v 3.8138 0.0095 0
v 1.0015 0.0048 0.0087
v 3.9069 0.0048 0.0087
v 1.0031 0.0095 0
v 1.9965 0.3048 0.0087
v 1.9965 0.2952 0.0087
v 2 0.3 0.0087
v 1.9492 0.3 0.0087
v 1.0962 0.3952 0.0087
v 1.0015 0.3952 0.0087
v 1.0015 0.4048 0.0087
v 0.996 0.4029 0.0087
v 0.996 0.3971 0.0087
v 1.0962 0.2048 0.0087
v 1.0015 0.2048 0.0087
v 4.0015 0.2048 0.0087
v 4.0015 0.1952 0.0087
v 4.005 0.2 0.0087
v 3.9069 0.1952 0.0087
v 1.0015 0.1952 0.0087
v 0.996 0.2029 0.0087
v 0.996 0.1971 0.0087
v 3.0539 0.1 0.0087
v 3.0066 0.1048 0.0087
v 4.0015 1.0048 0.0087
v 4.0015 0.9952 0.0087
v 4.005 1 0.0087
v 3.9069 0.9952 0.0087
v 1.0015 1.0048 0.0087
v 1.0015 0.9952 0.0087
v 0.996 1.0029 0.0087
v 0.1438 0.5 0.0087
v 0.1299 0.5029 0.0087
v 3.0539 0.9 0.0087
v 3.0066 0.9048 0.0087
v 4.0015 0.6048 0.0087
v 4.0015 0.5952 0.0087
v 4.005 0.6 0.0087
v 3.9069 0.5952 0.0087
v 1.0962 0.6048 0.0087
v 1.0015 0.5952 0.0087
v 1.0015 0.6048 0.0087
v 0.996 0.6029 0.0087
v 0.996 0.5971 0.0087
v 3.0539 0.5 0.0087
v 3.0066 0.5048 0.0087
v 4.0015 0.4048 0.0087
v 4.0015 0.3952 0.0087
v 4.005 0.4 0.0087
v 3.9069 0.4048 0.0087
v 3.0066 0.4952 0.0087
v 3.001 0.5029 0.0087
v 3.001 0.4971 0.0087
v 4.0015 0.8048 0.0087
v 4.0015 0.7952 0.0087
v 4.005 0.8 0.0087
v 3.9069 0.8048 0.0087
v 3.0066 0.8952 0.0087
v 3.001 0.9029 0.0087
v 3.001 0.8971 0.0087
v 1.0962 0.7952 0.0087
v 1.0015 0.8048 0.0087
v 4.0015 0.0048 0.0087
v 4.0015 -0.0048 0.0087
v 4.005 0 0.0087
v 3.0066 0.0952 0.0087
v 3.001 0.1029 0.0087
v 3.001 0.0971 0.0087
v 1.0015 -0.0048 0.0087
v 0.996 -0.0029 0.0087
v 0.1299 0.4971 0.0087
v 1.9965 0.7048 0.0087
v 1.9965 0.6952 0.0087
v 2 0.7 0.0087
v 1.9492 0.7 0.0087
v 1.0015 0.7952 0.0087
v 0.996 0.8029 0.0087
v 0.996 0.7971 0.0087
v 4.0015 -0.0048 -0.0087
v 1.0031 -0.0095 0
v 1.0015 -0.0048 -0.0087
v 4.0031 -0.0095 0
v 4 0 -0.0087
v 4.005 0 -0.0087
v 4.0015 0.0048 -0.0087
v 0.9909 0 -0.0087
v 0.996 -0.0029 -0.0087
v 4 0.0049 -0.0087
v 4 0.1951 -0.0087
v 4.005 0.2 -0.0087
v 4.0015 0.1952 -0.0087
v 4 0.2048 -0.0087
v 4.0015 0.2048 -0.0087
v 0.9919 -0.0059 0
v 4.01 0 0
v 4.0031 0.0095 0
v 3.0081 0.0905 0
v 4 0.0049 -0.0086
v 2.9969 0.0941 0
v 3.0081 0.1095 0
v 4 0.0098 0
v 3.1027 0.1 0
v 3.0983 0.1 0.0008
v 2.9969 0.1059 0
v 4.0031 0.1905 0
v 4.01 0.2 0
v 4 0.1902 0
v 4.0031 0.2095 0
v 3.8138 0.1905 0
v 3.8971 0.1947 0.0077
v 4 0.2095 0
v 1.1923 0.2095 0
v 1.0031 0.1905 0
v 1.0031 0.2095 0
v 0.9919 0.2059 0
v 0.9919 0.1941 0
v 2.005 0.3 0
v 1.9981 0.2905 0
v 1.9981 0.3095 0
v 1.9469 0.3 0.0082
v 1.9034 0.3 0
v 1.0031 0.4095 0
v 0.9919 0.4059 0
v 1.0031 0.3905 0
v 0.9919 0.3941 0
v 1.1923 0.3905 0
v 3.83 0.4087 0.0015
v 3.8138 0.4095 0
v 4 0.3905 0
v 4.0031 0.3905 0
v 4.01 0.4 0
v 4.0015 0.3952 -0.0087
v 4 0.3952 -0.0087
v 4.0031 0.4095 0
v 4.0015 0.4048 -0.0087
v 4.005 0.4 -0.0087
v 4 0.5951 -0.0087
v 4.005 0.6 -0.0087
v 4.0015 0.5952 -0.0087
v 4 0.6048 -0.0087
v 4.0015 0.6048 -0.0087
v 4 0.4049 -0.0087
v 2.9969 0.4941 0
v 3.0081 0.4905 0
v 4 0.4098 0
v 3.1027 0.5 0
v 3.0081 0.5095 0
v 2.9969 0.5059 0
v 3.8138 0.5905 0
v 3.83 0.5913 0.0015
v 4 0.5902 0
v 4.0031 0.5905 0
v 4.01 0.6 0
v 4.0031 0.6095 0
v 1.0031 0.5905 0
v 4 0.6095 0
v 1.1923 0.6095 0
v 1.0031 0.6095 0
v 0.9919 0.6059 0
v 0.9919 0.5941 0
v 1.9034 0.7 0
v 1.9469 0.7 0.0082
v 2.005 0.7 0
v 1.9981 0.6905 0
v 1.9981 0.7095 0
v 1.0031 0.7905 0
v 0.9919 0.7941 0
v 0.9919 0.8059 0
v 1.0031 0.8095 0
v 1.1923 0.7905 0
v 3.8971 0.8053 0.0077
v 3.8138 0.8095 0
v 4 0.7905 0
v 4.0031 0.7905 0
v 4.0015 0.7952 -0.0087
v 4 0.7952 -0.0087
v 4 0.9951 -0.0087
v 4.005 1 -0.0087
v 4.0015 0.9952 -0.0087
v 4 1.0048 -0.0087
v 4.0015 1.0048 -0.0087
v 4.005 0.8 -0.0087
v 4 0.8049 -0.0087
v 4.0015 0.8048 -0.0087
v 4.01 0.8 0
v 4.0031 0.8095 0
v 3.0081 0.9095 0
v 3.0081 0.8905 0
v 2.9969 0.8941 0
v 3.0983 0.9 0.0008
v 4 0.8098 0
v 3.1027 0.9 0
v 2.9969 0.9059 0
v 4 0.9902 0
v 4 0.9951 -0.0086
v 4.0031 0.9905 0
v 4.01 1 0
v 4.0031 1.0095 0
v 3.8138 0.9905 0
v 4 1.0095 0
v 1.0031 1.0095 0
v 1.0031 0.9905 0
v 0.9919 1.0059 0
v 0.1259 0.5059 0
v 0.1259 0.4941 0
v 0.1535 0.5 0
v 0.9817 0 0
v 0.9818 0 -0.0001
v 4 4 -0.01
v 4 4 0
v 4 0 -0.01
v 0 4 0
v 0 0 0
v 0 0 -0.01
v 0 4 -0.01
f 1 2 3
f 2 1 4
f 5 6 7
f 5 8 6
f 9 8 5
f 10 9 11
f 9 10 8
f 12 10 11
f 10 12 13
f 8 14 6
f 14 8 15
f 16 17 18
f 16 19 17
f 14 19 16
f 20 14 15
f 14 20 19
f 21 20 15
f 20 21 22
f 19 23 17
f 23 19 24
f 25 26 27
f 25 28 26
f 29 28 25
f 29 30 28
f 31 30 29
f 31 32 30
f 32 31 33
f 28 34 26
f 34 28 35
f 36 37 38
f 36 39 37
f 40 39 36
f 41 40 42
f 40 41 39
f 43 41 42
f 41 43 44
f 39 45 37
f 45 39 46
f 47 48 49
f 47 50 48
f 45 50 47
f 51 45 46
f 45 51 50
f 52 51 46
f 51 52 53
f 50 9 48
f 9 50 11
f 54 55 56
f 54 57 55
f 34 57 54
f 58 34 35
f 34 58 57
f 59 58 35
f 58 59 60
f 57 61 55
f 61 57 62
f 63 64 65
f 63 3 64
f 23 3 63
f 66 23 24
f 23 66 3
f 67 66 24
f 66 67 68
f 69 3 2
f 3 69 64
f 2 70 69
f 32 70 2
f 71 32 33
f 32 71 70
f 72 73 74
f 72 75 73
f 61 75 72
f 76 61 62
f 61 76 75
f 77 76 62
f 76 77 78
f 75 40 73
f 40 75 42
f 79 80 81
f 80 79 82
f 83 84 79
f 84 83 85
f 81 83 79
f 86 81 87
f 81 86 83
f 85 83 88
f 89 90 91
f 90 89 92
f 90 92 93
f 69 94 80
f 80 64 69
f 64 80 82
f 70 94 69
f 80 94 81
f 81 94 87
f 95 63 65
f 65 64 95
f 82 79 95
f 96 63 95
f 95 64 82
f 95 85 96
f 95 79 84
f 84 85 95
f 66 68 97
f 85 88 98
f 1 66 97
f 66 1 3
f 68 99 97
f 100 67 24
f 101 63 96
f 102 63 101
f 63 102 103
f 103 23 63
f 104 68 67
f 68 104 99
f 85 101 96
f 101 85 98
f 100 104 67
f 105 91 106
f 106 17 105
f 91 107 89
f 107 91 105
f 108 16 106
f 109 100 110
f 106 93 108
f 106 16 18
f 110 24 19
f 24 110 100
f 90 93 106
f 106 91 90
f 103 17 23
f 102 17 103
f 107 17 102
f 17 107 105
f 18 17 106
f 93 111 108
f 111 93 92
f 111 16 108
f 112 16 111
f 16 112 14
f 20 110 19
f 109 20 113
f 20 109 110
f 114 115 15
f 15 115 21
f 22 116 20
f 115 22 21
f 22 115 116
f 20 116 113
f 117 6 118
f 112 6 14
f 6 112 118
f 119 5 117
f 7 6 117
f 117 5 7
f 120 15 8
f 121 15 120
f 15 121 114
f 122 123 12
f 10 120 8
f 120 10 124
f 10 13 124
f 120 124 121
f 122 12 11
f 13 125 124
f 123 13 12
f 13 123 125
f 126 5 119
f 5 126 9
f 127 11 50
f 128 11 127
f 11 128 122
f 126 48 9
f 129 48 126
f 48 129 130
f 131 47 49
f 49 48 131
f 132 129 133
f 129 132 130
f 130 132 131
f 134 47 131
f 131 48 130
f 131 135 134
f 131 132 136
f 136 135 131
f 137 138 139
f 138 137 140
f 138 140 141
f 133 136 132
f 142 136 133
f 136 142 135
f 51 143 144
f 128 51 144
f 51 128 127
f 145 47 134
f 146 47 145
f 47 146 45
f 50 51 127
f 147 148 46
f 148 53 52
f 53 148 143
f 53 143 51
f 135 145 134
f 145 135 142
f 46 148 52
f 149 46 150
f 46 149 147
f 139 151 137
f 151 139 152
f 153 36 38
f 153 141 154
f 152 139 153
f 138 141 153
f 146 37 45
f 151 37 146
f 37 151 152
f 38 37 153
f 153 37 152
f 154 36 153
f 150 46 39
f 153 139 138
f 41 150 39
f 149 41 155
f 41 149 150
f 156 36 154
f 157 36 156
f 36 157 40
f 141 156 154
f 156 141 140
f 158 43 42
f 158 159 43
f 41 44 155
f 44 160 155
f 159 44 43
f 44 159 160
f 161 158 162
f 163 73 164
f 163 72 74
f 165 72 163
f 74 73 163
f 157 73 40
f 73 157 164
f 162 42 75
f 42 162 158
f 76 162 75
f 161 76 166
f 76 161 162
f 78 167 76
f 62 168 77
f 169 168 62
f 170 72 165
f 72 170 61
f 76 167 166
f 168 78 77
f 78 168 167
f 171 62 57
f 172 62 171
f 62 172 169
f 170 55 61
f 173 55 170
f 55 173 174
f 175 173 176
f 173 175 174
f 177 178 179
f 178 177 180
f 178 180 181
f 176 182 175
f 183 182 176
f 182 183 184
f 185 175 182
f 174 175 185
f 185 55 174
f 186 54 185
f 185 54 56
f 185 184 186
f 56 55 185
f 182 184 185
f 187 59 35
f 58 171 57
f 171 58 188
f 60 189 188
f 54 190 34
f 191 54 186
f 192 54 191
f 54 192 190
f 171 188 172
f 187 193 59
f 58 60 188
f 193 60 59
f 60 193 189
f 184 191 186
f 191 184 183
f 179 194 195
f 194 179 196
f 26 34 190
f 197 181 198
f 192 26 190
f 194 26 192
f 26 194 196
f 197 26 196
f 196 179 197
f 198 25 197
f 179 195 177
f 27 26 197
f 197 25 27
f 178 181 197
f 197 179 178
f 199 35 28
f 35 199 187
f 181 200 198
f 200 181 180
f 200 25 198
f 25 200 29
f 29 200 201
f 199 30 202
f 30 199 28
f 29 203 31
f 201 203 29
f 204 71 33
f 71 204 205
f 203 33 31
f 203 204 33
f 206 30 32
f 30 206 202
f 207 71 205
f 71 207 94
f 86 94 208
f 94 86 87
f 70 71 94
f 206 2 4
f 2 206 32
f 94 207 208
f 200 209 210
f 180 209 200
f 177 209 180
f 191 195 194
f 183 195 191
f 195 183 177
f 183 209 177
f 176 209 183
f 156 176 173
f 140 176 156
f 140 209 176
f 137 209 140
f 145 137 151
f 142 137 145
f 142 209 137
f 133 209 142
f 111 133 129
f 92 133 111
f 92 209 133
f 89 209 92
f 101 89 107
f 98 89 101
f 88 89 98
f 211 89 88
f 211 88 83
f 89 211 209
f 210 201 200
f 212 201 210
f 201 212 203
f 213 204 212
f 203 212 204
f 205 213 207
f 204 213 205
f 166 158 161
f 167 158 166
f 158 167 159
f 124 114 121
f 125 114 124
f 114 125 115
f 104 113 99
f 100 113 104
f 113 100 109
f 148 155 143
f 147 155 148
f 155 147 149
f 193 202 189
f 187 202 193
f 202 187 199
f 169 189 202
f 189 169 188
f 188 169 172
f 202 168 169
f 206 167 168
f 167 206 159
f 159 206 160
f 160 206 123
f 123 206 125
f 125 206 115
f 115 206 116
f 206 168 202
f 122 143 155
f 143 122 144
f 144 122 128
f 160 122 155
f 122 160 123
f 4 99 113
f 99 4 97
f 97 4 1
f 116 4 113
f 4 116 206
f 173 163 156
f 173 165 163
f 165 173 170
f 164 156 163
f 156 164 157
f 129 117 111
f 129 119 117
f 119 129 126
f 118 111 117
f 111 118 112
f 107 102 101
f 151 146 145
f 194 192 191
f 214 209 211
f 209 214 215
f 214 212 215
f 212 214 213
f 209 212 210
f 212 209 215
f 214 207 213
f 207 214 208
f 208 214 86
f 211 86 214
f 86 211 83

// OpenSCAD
hull(){
    translate([1.0, 0.0]) sphere(0.01);
    translate([2.0, 0.0]) sphere(0.01);
}
hull(){
    translate([2.0, 0.0]) sphere(0.01);
    translate([3.0, 0.0]) sphere(0.01);
}
hull(){
    translate([3.0, 0.0]) sphere(0.01);
    translate([4.0, 0.0]) sphere(0.01);
}
hull(){
    translate([4.0, 0.0]) sphere(0.01);
    translate([3.00501256289338, 0.1]) sphere(0.01);
}
hull(){
    translate([3.00501256289338, 0.1]) sphere(0.01);
    translate([4.0, 0.2]) sphere(0.01);
}
hull(){
    translate([4.0, 0.2]) sphere(0.01);
    translate([3.0, 0.2]) sphere(0.01);
}
hull(){
    translate([3.0, 0.2]) sphere(0.01);
    translate([2.0, 0.2]) sphere(0.01);
}
hull(){
    translate([2.0, 0.2]) sphere(0.01);
    translate([1.0, 0.2]) sphere(0.01);
}
hull(){
    translate([1.0, 0.2]) sphere(0.01);
    translate([1.99498743710662, 0.3]) sphere(0.01);
}
hull(){
    translate([1.99498743710662, 0.3]) sphere(0.01);
    translate([1.0, 0.4]) sphere(0.01);
}
hull(){
    translate([1.0, 0.4]) sphere(0.01);
    translate([2.0, 0.4]) sphere(0.01);
}
hull(){
    translate([2.0, 0.4]) sphere(0.01);
    translate([3.0, 0.4]) sphere(0.01);
}
hull(){
    translate([3.0, 0.4]) sphere(0.01);
    translate([4.0, 0.4]) sphere(0.01);
}
hull(){
    translate([4.0, 0.4]) sphere(0.01);
    translate([3.00501256289338, 0.5]) sphere(0.01);
}
hull(){
    translate([3.00501256289338, 0.5]) sphere(0.01);
    translate([4.0, 0.6]) sphere(0.01);
}
hull(){
    translate([4.0, 0.6]) sphere(0.01);
    translate([3.0, 0.6]) sphere(0.01);
}
hull(){
    translate([3.0, 0.6]) sphere(0.01);
    translate([2.0, 0.6]) sphere(0.01);
}
hull(){
    translate([2.0, 0.6]) sphere(0.01);
    translate([1.0, 0.6]) sphere(0.01);
}
hull(){
    translate([1.0, 0.6]) sphere(0.01);
    translate([1.99498743710662, 0.7]) sphere(0.01);
}
hull(){
    translate([1.99498743710662, 0.7]) sphere(0.01);
    translate([1.0, 0.8]) sphere(0.01);
}
hull(){
    translate([1.0, 0.8]) sphere(0.01);
    translate([2.0, 0.8]) sphere(0.01);
}
hull(){
    translate([2.0, 0.8]) sphere(0.01);
    translate([3.0, 0.8]) sphere(0.01);
}
hull(){
    translate([3.0, 0.8]) sphere(0.01);
    translate([4.0, 0.8]) sphere(0.01);
}
hull(){
    translate([4.0, 0.8]) sphere(0.01);
    translate([3.00501256289338, 0.9]) sphere(0.01);
}
hull(){
    translate([3.00501256289338, 0.9]) sphere(0.01);
    translate([4.0, 1.0]) sphere(0.01);
}
hull(){
    translate([4.0, 1.0]) sphere(0.01);
    translate([3.0, 1.0]) sphere(0.01);
}
hull(){
    translate([3.0, 1.0]) sphere(0.01);
    translate([2.0, 1.0]) sphere(0.01);
}
hull(){
    translate([2.0, 1.0]) sphere(0.01);
    translate([1.0, 1.0]) sphere(0.01);
}
hull(){
    translate([1.0, 1.0]) sphere(0.01);
    translate([0.13397459621556, 0.5]) sphere(0.01);
}
hull(){
    translate([0.13397459621556, 0.5]) sphere(0.01);
    translate([1.0, 0.0]) sphere(0.01);
}
translate([0,0,-0.01]) color([0.1,0.1,0.1]) cube([4,4,0.01]);
